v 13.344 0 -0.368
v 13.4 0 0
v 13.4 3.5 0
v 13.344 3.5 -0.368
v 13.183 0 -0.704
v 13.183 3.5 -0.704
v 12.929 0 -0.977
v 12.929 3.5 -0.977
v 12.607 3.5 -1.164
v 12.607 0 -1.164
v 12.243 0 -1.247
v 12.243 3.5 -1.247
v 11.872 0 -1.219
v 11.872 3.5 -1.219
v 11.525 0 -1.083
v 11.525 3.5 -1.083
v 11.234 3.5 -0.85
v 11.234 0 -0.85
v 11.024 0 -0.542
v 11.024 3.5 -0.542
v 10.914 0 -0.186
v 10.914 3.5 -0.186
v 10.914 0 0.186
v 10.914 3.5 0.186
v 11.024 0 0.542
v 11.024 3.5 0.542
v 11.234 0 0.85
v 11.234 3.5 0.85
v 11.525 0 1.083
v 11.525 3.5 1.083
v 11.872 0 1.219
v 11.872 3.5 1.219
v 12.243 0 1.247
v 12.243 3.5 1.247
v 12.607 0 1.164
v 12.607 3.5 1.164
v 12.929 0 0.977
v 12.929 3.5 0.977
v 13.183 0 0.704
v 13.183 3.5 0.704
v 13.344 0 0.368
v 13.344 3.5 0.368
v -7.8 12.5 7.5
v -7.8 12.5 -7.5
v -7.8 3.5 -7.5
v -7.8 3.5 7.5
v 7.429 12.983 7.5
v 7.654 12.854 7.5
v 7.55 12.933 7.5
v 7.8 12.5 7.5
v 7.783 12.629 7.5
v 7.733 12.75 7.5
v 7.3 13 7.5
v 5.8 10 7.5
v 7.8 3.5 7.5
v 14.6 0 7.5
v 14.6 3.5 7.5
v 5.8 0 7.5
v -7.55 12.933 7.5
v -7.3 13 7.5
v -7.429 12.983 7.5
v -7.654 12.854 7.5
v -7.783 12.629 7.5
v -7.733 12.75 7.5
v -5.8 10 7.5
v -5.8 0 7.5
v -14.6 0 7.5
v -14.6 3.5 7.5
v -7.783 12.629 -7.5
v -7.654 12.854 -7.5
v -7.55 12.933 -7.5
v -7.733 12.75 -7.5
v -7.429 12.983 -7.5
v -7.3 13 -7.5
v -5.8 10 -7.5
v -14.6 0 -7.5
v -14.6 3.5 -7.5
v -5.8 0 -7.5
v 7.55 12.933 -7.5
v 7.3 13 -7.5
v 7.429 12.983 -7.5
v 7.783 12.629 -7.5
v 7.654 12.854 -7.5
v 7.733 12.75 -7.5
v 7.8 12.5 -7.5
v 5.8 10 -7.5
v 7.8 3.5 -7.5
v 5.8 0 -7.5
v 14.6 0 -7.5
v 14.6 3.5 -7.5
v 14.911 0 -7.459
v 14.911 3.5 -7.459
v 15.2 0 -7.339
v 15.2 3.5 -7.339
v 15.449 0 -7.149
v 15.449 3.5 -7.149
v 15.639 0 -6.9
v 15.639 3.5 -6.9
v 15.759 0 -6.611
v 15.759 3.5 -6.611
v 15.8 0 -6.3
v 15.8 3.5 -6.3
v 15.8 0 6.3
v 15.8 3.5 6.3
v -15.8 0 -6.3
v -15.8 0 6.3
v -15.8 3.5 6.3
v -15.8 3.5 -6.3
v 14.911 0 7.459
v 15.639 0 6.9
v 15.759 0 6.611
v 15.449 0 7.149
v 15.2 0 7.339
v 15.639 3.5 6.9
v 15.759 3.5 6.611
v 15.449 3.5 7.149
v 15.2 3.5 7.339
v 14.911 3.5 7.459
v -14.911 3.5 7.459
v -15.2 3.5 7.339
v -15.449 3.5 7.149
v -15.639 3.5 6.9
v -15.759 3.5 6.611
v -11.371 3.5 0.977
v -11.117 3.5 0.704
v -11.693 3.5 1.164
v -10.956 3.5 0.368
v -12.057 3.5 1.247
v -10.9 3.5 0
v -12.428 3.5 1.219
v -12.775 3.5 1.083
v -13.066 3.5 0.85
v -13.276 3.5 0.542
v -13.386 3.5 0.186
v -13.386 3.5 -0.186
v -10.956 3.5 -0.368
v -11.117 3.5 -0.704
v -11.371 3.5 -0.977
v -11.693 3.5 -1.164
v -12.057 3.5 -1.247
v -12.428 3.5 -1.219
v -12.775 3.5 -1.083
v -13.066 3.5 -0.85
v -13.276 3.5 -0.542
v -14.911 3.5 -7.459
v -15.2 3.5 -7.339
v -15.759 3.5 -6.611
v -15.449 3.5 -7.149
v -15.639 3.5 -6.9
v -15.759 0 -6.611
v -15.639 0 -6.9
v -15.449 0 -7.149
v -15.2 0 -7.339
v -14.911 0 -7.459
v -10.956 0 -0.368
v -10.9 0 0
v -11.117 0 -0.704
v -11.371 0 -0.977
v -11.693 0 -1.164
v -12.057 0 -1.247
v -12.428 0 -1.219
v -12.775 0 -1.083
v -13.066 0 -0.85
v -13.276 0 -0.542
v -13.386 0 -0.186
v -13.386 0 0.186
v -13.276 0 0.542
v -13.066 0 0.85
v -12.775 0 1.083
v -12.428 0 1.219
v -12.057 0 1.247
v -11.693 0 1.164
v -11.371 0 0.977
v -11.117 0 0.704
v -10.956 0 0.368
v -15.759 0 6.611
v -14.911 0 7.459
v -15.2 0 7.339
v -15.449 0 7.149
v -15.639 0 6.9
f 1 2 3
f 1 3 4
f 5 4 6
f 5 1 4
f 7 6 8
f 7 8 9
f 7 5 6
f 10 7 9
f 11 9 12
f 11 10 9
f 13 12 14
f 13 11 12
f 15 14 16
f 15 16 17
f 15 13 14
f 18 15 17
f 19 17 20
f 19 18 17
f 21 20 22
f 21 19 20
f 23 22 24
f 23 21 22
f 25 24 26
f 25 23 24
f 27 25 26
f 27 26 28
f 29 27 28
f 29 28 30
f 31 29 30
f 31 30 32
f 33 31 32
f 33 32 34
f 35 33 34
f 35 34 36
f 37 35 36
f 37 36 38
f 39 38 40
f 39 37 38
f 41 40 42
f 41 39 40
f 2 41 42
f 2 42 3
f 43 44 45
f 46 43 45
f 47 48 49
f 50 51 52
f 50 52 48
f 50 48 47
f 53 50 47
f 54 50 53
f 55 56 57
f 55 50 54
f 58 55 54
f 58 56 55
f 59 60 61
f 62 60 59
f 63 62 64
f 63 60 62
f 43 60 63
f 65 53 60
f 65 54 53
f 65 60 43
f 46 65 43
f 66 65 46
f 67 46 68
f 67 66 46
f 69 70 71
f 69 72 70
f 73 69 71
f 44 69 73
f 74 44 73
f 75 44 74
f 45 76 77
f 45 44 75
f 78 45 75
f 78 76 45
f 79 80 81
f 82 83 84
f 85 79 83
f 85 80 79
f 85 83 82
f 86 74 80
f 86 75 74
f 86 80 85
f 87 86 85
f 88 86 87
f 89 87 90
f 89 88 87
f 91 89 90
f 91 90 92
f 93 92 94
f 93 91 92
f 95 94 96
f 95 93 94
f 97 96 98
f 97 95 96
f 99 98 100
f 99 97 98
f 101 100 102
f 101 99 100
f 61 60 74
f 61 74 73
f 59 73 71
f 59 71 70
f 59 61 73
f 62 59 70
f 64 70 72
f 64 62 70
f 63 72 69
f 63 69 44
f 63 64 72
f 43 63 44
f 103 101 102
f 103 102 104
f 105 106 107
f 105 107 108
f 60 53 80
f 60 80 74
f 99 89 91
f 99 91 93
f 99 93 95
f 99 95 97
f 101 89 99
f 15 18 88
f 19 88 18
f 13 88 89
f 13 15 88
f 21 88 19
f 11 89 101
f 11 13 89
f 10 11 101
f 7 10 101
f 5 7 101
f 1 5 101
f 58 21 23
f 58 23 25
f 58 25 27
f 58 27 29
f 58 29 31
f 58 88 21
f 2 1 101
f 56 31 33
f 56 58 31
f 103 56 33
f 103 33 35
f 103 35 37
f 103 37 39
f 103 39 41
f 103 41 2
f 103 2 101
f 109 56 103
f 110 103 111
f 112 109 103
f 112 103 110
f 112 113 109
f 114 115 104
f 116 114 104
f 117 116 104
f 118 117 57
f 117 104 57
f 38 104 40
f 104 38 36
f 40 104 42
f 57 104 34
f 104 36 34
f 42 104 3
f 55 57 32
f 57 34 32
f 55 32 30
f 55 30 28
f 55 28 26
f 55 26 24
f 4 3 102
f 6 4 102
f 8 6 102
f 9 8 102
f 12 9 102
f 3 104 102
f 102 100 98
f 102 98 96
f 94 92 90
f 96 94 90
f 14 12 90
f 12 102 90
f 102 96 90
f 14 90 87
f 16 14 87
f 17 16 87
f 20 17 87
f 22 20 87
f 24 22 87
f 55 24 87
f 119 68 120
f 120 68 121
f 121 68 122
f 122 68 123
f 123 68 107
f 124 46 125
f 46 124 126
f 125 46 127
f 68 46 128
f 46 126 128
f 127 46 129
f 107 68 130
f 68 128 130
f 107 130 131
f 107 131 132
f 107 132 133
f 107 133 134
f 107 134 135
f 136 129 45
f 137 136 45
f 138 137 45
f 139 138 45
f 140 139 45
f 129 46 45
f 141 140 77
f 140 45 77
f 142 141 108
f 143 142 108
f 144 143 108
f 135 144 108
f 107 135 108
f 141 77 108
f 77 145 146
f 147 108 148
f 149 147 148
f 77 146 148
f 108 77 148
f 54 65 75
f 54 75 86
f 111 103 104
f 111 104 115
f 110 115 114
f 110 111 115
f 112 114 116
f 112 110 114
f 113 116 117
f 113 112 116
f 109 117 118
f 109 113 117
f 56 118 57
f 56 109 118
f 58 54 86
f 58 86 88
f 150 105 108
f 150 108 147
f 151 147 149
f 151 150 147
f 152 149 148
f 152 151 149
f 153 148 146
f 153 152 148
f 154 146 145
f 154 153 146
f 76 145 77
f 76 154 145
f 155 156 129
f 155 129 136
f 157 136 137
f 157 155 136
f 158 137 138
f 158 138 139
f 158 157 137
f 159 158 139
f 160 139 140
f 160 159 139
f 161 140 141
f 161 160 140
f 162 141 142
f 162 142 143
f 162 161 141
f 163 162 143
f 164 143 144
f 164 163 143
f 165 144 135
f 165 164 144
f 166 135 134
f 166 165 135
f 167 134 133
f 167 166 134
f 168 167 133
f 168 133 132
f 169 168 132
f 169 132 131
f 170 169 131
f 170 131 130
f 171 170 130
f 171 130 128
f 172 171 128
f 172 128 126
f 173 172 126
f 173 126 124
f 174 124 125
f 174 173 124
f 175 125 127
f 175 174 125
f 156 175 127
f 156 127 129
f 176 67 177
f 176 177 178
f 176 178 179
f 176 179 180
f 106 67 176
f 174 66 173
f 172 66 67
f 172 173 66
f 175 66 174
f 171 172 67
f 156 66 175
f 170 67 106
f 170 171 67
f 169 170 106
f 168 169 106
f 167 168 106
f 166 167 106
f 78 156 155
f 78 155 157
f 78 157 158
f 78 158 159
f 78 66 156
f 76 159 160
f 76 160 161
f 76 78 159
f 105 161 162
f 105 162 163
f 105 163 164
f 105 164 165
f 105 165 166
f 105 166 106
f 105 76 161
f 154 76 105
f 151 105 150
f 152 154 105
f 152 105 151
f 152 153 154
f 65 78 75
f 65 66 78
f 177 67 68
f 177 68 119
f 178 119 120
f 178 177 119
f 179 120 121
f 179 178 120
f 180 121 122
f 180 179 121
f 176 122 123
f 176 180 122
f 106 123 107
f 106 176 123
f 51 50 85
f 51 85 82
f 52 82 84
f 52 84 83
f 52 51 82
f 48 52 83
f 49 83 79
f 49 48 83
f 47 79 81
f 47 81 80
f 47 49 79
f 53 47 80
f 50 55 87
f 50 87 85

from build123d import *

# Parameters (mm, degrees)
BOSS_EXTRUDE1_DEPTH = 7.5
SKETCH3_R           = 1.25
BOSS_EXTRUDE2_DEPTH = 3.5


with BuildPart() as part:
    # Sketch1 → Boss-Extrude1 (new body, symmetric)
    with BuildSketch(Plane.XY):
        with BuildLine():
            Line((-5.8, 0), (-5.8, 10))
            Line((-5.8, 10), (5.8, 10))
            Line((5.8, 10), (5.8, 0))
            Line((5.8, 0), (7.8, 0))
            Line((7.8, 0), (7.8, 12.5))
            ThreePointArc((7.8, 12.5), (7.653553391, 12.853553391), (7.3, 13))
            Line((7.3, 13), (5.857116976, 13))
            Line((5.857116976, 13), (-7.3, 13))
            ThreePointArc((-7.3, 13), (-7.653553391, 12.853553391), (-7.8, 12.5))
            Line((-7.8, 12.5), (-7.8, 10))
            Line((-7.8, 10), (-7.8, 0))
            Line((-7.8, 0), (-5.8, 0))
        make_face()
    extrude(amount=BOSS_EXTRUDE1_DEPTH, both=True)

    # Sketch3 → Boss-Extrude2 (add)
    with BuildSketch(Plane(origin=(0, 0, 0), x_dir=(1, 0, 0), z_dir=(0, 1, 0))):
        with BuildLine():
            ThreePointArc((-14.6, -7.5), (-15.448528137, -7.148528137), (-15.8, -6.3))
            Line((-15.8, -6.3), (-15.8, 6.3))
            ThreePointArc((-15.8, 6.3), (-15.448528137, 7.148528137), (-14.6, 7.5))
            Line((-14.6, 7.5), (-7.8, 7.5))
            Line((-7.8, 7.5), (-7.8, -7.5))
            Line((-7.8, -7.5), (-14.6, -7.5))
        make_face()
        with Locations((-12.15, 0)):
            Circle(SKETCH3_R, mode=Mode.SUBTRACT)
        with BuildLine():
            ThreePointArc((14.6, 7.5), (15.448528137, 7.148528137), (15.8, 6.3))
            Line((15.8, 6.3), (15.8, -6.3))
            ThreePointArc((15.8, -6.3), (15.448528137, -7.148528137), (14.6, -7.5))
            Line((14.6, -7.5), (7.8, -7.5))
            Line((7.8, -7.5), (7.8, 7.5))
            Line((7.8, 7.5), (14.6, 7.5))
        make_face()
        with Locations((12.15, 0)):
            Circle(SKETCH3_R, mode=Mode.SUBTRACT)
    extrude(amount=BOSS_EXTRUDE2_DEPTH)


solid = part.part
